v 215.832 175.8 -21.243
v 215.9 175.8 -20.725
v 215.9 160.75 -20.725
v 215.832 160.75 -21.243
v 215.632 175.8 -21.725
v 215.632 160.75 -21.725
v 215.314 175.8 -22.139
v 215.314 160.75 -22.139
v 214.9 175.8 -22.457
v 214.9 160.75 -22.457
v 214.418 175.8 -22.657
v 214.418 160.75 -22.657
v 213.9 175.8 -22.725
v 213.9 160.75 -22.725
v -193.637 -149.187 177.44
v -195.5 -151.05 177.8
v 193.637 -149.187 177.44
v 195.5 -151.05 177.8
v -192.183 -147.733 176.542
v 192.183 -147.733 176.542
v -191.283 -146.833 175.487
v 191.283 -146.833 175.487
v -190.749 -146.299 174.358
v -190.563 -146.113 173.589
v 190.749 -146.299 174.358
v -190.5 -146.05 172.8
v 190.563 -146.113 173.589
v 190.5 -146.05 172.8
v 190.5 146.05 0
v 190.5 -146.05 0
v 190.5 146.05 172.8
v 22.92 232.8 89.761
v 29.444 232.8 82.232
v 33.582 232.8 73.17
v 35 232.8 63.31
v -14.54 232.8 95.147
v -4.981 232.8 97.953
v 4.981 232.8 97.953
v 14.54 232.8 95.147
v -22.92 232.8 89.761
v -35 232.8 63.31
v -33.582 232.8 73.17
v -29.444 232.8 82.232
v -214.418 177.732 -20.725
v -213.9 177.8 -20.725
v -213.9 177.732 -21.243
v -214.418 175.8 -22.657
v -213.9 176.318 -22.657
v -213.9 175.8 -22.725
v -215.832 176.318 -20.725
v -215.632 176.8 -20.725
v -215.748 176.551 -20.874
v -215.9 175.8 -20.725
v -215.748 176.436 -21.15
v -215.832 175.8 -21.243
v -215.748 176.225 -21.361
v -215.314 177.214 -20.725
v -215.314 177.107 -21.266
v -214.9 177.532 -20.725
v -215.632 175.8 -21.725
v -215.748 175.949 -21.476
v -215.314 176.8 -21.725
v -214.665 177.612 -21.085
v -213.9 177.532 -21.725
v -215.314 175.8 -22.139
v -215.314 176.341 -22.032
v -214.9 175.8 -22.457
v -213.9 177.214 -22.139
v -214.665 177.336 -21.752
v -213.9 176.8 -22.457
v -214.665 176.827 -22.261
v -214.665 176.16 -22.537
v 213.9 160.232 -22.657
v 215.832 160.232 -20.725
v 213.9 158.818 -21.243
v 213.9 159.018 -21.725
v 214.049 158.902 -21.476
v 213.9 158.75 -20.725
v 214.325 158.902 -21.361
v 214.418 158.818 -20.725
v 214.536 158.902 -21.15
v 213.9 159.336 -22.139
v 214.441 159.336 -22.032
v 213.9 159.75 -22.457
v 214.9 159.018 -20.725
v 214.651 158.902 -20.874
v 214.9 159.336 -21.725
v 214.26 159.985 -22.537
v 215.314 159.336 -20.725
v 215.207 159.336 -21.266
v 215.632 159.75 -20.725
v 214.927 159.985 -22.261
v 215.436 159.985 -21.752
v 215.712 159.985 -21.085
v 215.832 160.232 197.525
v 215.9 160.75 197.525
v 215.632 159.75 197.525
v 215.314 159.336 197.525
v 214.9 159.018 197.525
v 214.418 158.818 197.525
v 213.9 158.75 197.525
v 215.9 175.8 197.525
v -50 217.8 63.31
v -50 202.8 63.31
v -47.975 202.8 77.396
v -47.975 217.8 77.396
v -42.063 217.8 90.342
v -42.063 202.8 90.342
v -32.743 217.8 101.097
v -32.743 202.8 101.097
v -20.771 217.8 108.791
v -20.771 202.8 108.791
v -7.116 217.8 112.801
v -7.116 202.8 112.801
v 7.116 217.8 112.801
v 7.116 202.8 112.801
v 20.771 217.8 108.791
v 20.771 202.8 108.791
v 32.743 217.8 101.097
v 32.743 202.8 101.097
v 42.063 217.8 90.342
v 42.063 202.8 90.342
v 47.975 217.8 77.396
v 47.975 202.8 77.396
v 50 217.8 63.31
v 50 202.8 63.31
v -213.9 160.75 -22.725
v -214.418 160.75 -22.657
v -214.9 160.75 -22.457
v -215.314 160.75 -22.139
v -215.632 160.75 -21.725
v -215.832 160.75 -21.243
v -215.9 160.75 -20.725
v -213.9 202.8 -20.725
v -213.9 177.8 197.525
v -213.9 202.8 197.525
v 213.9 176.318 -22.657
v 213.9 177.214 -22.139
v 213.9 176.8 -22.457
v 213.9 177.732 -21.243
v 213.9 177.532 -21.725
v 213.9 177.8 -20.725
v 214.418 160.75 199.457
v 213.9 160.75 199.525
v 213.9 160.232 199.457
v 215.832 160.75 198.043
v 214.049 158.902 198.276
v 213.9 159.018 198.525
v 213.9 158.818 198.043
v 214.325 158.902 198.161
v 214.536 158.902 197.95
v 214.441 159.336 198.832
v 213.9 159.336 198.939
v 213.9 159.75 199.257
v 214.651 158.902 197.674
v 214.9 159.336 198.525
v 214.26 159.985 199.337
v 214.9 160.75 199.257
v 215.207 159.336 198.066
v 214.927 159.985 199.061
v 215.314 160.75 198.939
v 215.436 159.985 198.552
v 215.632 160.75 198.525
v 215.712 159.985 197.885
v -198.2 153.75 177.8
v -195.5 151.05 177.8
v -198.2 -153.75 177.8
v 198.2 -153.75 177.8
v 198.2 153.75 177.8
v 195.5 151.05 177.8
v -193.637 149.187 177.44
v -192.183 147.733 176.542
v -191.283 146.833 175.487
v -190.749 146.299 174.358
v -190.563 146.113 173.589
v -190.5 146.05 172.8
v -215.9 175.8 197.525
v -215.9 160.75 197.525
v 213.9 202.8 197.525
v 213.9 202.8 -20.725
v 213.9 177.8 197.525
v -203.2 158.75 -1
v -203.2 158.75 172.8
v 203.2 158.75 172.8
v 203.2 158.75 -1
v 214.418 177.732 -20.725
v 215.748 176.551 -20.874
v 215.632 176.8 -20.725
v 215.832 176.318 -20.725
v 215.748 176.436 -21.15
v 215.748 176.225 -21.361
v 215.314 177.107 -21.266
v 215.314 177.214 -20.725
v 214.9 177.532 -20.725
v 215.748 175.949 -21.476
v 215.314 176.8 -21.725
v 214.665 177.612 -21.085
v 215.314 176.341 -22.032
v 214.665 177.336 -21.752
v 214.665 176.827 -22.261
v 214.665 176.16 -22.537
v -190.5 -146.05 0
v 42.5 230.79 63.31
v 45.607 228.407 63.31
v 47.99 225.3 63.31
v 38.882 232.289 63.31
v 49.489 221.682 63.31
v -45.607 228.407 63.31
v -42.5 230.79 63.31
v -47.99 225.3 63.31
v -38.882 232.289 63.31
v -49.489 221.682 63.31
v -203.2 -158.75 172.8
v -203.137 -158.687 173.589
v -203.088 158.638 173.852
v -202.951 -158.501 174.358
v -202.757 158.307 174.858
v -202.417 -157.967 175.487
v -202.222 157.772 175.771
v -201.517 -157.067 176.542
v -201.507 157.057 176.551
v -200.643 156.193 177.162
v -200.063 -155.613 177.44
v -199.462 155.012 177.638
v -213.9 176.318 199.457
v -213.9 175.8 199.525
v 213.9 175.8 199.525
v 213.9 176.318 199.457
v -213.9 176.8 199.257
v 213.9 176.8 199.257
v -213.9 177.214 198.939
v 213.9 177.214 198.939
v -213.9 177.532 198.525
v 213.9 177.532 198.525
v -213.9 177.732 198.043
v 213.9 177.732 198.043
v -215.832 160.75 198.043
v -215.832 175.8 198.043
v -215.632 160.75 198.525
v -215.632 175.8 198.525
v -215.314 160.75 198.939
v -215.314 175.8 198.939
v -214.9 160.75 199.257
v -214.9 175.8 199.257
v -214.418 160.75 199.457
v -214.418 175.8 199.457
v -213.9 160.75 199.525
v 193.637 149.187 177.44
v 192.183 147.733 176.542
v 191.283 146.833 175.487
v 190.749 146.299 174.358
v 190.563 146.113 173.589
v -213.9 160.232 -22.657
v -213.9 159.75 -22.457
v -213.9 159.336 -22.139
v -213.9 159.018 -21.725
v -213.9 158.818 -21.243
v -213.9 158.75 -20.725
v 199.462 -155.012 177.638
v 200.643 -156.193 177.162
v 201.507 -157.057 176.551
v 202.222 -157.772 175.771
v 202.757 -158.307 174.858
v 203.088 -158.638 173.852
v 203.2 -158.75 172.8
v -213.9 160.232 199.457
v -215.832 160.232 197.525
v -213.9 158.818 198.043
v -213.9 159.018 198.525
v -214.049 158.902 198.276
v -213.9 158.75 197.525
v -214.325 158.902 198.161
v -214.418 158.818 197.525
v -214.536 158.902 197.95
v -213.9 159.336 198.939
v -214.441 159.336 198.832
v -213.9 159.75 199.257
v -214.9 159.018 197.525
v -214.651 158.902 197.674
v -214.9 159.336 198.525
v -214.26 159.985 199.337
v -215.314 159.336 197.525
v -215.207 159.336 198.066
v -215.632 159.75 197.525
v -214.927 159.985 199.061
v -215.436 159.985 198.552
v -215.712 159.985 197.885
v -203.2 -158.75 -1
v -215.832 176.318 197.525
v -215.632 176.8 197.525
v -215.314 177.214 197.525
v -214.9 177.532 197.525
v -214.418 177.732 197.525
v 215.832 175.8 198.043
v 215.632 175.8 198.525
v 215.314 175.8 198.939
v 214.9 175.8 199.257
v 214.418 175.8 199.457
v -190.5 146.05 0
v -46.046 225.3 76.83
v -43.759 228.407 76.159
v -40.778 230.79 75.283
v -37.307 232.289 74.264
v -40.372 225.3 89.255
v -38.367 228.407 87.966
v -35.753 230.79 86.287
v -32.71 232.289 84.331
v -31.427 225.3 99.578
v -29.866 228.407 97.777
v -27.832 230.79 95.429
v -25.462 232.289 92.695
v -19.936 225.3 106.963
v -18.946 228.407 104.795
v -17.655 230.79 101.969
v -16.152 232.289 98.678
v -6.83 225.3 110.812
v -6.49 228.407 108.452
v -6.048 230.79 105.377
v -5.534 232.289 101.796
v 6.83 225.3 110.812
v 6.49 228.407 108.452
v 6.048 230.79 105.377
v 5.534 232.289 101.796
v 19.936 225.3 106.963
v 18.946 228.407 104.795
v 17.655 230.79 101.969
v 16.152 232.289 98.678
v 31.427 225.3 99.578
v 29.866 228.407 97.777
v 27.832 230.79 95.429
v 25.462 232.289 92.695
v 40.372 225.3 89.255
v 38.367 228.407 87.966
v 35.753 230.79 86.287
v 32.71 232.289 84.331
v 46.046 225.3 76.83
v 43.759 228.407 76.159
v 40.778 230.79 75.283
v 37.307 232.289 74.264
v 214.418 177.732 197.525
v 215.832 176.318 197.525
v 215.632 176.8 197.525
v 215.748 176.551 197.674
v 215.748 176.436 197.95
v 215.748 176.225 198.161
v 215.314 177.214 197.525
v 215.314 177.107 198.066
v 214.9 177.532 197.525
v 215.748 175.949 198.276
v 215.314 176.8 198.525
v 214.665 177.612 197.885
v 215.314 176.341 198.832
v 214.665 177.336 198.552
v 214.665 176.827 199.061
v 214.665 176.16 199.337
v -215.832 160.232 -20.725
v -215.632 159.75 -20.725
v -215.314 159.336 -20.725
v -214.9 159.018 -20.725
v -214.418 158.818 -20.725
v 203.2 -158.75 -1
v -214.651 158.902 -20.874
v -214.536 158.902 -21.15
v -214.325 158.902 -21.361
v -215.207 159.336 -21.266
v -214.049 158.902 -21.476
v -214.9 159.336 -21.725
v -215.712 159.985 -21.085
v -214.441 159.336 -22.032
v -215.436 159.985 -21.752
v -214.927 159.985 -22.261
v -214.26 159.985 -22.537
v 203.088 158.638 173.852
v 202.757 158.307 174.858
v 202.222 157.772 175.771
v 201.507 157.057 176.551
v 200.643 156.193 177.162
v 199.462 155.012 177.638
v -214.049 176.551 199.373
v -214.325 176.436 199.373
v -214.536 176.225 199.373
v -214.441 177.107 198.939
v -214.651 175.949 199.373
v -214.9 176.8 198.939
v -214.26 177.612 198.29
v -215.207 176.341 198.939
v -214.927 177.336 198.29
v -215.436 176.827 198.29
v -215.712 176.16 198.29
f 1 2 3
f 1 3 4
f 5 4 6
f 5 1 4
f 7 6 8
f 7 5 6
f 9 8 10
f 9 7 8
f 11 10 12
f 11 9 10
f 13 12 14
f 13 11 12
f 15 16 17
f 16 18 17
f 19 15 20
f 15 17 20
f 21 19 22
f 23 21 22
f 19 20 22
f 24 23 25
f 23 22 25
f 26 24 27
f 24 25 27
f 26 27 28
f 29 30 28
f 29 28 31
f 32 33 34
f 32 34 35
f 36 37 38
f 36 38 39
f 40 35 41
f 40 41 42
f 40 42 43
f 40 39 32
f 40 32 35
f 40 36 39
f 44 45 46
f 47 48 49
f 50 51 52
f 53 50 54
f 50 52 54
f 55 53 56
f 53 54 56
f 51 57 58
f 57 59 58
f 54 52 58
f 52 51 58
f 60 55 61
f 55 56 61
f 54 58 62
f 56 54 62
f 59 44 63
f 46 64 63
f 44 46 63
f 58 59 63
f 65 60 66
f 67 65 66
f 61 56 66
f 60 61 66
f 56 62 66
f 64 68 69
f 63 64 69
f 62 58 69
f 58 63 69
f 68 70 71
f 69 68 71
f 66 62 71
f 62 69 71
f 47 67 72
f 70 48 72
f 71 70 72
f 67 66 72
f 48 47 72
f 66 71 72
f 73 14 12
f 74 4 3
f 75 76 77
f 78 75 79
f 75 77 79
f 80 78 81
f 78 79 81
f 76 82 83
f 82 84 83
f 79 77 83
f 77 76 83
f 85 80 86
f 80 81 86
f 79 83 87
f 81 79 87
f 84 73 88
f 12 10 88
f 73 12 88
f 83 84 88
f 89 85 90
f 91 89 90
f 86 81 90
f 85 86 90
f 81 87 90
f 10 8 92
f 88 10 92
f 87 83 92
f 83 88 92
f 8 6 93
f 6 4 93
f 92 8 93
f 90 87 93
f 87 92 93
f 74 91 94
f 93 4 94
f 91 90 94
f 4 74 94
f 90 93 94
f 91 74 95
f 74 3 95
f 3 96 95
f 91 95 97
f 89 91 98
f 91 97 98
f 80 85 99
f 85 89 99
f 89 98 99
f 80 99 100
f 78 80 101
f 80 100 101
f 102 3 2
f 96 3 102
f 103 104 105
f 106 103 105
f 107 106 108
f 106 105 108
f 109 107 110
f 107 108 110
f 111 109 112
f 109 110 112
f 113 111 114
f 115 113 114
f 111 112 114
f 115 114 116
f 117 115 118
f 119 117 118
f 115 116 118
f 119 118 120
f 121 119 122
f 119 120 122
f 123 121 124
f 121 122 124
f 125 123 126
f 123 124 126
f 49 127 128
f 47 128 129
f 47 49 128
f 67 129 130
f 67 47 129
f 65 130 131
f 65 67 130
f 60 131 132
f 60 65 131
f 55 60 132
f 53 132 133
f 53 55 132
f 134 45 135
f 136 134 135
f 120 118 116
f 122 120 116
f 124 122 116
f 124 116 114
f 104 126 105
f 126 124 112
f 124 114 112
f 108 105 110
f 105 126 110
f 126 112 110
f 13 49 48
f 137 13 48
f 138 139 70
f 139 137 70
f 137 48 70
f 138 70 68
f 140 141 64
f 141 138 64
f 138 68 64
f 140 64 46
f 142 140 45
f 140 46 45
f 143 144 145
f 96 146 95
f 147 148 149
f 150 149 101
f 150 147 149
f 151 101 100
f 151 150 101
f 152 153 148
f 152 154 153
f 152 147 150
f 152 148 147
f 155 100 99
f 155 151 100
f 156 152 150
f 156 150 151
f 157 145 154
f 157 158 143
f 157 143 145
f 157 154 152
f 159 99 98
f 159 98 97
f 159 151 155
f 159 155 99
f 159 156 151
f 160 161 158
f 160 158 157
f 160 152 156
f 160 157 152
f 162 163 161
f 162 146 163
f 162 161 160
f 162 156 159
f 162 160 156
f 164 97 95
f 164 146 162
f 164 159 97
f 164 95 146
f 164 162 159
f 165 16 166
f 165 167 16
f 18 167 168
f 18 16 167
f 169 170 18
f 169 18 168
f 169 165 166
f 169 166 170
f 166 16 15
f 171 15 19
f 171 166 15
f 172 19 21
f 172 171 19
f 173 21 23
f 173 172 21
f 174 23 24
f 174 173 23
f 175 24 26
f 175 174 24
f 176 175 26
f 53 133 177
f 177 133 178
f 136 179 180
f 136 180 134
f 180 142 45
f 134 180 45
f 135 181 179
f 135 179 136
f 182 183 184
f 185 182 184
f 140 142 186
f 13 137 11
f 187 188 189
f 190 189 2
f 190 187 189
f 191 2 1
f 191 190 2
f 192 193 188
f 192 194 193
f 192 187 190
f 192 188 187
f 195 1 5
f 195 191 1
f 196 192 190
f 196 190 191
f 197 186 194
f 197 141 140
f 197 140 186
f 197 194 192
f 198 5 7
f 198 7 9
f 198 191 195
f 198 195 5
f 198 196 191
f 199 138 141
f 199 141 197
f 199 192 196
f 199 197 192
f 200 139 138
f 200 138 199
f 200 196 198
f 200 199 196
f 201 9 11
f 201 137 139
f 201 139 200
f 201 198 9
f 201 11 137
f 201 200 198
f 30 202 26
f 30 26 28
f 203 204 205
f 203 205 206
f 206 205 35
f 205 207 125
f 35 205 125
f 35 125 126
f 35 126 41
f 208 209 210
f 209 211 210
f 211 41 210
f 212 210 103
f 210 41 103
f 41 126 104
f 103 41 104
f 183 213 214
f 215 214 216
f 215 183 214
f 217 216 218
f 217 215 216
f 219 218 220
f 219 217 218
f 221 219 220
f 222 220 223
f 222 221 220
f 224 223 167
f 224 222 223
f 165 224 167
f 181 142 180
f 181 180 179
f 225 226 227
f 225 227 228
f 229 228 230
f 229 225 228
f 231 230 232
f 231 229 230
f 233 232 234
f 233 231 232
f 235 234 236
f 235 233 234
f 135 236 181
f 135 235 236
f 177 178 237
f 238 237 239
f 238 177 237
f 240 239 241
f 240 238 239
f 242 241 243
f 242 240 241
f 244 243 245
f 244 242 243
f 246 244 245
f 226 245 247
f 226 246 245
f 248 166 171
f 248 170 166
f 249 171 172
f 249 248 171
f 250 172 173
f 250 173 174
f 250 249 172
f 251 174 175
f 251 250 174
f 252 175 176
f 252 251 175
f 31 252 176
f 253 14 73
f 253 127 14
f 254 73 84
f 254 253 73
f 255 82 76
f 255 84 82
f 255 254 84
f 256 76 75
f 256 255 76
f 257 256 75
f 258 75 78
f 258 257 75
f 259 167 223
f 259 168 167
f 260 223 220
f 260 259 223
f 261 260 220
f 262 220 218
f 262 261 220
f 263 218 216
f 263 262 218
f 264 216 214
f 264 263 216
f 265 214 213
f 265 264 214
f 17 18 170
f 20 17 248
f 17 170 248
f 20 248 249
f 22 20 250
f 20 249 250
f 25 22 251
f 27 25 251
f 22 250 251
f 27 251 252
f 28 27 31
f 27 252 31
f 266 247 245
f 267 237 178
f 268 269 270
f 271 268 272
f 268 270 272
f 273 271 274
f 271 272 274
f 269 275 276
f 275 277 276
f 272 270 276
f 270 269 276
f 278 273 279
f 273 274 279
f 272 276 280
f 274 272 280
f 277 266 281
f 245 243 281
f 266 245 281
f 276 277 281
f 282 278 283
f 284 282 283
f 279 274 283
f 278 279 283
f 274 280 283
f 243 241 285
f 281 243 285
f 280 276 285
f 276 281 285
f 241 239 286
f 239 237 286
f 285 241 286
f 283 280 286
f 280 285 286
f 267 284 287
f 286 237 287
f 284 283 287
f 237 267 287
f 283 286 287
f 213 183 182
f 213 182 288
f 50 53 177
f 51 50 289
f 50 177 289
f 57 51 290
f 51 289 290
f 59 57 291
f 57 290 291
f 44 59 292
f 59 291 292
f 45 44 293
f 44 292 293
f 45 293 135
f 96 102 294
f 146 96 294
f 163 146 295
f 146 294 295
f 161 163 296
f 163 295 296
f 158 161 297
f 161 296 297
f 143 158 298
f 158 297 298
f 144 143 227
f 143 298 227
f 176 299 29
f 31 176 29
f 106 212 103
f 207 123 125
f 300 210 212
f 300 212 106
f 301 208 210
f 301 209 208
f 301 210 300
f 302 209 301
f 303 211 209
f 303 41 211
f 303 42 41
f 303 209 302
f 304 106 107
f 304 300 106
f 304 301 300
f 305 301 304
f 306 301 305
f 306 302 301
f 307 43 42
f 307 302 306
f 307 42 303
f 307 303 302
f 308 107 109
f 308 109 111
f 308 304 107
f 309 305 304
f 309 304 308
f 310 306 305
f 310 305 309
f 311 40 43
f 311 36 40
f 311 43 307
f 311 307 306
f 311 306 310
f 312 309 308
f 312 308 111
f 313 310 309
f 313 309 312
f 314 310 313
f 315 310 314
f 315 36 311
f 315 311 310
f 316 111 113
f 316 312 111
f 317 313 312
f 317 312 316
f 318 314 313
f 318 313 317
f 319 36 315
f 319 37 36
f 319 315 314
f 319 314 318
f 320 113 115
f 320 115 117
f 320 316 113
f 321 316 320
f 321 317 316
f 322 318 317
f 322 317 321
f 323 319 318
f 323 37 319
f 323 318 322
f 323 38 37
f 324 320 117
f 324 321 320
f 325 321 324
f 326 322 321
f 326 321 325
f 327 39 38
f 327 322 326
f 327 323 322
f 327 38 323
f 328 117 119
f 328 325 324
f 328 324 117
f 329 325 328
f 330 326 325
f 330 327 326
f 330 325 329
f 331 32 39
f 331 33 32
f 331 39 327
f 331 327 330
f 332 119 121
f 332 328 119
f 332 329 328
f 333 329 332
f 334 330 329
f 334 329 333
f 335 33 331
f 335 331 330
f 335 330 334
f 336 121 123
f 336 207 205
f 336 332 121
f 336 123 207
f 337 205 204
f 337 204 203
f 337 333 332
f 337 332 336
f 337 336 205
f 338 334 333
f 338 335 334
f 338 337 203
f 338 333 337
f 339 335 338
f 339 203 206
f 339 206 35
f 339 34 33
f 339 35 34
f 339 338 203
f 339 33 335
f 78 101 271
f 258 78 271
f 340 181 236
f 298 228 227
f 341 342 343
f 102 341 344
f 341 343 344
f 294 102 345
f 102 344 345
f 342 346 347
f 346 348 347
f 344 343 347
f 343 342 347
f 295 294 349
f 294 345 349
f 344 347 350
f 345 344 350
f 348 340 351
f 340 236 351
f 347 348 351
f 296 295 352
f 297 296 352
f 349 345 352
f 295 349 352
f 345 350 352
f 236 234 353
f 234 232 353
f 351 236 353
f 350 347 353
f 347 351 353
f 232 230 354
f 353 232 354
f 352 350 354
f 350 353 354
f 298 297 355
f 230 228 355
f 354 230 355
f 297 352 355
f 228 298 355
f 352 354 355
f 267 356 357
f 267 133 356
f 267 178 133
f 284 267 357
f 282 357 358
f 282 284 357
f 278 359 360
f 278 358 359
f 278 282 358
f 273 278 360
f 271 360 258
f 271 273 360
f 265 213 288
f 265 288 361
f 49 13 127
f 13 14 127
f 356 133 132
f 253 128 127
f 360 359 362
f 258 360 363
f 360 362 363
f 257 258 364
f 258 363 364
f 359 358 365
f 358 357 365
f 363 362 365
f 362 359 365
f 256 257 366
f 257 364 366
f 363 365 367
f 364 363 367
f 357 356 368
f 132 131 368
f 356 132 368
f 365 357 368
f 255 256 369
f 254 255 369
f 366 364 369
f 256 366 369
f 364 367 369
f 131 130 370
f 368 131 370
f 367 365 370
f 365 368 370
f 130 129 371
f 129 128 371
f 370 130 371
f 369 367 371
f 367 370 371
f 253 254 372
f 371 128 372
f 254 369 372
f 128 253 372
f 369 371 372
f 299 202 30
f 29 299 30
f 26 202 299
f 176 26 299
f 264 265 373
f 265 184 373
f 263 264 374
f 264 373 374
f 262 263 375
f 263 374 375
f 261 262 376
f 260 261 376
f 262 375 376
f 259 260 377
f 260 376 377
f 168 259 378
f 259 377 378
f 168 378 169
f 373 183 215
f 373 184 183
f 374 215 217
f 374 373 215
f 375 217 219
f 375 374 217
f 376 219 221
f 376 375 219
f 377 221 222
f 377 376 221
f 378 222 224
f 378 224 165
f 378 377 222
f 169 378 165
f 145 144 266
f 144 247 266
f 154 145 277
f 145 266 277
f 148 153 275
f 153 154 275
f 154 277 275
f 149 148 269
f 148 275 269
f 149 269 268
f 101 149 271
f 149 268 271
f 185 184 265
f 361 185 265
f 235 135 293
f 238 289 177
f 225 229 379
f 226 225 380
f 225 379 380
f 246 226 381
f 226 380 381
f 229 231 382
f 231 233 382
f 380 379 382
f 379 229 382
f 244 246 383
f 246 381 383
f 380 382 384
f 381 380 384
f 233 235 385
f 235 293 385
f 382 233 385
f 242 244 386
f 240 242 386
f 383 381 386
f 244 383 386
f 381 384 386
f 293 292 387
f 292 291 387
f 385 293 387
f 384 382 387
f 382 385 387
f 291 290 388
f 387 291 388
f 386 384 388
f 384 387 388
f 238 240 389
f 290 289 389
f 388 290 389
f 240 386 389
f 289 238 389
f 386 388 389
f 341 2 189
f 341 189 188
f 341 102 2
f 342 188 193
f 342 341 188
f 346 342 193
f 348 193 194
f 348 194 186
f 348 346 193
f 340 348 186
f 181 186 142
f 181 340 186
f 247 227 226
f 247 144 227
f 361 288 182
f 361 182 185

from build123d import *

# Parameters (mm, degrees)
F0_W      = 406.4
F0_H      = 317.5
F0_W_2    = 381
F0_H_2    = 292.1
F1_DEPTH  = 177.8
F2_W      = 406.4
F2_H      = 317.5
F3_DEPTH  = 1
F4_W      = 431.8
F4_H      = 222.25
F5_DEPTH  = 19.05
F6_R      = 5
F7_R      = 2
F5_FACE_W = 427.8
F5_FACE_H = 218.25
F8_DEPTH  = 25
F10_DEPTH = 30
F11_R     = 15


with BuildPart() as f1:
    # F0 (on Top) → F1 (new body)
    with BuildSketch(Plane.XY):
        Rectangle(F0_W, F0_H)
        Rectangle(F0_W_2, F0_H_2, mode=Mode.SUBTRACT)
    extrude(amount=F1_DEPTH)

    # F2 (on face) → F3 (join)
    with BuildSketch(Plane(origin=(0, 0, 0), x_dir=(1, 0, 0), z_dir=(0, 0, -1))):
        Rectangle(F2_W, F2_H)
    extrude(amount=F3_DEPTH)

    # F6
    f6_edges = [f1.edges().sort_by_distance(p)[0] for p in [
        (203.2, 0, 177.8),
        (190.5, 0, 177.8),
        (0, -146.05, 177.8),
        (0, -158.75, 177.8),
        (-190.5, 0, 177.8),
        (-203.2, 0, 177.8),
        (0, 158.75, 177.8),
        (0, 146.05, 177.8),
    ]]
    fillet(f6_edges, radius=F6_R)


with BuildPart() as f5:
    # F4 (on face) → F5 (new body)
    with BuildSketch(Plane(origin=(0, 158.75, 0), x_dir=(-1, 0, 0), z_dir=(0, 1, 0))):
        with Locations((0, 88.4)):
            Rectangle(F4_W, F4_H)
    extrude(amount=F5_DEPTH)

    # F7
    f7_edges = [f5.edges().sort_by_distance(p)[0] for p in [
        (0, 177.8, -22.725),
        (-215.9, 177.8, 88.4),
        (0, 177.8, 199.525),
        (215.9, 177.8, 88.4),
        (-215.9, 168.275, 199.525),
        (215.9, 168.275, 199.525),
        (0, 158.75, 199.525),
        (-215.9, 168.275, -22.725),
        (-215.9, 158.75, 88.4),
        (215.9, 168.275, -22.725),
        (0, 158.75, -22.725),
        (215.9, 158.75, 88.4),
    ]]
    fillet(f7_edges, radius=F7_R)

    # F5_face (on face) → F8 (join)
    with BuildSketch(Plane(origin=(0, 177.8, 88.4), x_dir=(-1, 0, 0), z_dir=(0, 1, 0))):
        Rectangle(F5_FACE_W, F5_FACE_H)
    extrude(amount=F8_DEPTH)


with BuildPart() as f10:
    # F9 (on face) → F10 (new body)
    with BuildSketch(Plane(origin=(0, 202.8, 0), x_dir=(-1, 0, 0), z_dir=(0, 1, 0))):
        with BuildLine():
            Line((-50, 63.309692), (50, 63.309692))
            ThreePointArc((50, 63.309692), (0, 113.309692), (-50, 63.309692))
        make_face()
    extrude(amount=F10_DEPTH)

    # F11
    f11_edges = [f10.edges().sort_by_distance(p)[0] for p in [
        (0, 232.8, 113.309692),
    ]]
    fillet(f11_edges, radius=F11_R)


solid = Compound([f1.part, f5.part, f10.part])
